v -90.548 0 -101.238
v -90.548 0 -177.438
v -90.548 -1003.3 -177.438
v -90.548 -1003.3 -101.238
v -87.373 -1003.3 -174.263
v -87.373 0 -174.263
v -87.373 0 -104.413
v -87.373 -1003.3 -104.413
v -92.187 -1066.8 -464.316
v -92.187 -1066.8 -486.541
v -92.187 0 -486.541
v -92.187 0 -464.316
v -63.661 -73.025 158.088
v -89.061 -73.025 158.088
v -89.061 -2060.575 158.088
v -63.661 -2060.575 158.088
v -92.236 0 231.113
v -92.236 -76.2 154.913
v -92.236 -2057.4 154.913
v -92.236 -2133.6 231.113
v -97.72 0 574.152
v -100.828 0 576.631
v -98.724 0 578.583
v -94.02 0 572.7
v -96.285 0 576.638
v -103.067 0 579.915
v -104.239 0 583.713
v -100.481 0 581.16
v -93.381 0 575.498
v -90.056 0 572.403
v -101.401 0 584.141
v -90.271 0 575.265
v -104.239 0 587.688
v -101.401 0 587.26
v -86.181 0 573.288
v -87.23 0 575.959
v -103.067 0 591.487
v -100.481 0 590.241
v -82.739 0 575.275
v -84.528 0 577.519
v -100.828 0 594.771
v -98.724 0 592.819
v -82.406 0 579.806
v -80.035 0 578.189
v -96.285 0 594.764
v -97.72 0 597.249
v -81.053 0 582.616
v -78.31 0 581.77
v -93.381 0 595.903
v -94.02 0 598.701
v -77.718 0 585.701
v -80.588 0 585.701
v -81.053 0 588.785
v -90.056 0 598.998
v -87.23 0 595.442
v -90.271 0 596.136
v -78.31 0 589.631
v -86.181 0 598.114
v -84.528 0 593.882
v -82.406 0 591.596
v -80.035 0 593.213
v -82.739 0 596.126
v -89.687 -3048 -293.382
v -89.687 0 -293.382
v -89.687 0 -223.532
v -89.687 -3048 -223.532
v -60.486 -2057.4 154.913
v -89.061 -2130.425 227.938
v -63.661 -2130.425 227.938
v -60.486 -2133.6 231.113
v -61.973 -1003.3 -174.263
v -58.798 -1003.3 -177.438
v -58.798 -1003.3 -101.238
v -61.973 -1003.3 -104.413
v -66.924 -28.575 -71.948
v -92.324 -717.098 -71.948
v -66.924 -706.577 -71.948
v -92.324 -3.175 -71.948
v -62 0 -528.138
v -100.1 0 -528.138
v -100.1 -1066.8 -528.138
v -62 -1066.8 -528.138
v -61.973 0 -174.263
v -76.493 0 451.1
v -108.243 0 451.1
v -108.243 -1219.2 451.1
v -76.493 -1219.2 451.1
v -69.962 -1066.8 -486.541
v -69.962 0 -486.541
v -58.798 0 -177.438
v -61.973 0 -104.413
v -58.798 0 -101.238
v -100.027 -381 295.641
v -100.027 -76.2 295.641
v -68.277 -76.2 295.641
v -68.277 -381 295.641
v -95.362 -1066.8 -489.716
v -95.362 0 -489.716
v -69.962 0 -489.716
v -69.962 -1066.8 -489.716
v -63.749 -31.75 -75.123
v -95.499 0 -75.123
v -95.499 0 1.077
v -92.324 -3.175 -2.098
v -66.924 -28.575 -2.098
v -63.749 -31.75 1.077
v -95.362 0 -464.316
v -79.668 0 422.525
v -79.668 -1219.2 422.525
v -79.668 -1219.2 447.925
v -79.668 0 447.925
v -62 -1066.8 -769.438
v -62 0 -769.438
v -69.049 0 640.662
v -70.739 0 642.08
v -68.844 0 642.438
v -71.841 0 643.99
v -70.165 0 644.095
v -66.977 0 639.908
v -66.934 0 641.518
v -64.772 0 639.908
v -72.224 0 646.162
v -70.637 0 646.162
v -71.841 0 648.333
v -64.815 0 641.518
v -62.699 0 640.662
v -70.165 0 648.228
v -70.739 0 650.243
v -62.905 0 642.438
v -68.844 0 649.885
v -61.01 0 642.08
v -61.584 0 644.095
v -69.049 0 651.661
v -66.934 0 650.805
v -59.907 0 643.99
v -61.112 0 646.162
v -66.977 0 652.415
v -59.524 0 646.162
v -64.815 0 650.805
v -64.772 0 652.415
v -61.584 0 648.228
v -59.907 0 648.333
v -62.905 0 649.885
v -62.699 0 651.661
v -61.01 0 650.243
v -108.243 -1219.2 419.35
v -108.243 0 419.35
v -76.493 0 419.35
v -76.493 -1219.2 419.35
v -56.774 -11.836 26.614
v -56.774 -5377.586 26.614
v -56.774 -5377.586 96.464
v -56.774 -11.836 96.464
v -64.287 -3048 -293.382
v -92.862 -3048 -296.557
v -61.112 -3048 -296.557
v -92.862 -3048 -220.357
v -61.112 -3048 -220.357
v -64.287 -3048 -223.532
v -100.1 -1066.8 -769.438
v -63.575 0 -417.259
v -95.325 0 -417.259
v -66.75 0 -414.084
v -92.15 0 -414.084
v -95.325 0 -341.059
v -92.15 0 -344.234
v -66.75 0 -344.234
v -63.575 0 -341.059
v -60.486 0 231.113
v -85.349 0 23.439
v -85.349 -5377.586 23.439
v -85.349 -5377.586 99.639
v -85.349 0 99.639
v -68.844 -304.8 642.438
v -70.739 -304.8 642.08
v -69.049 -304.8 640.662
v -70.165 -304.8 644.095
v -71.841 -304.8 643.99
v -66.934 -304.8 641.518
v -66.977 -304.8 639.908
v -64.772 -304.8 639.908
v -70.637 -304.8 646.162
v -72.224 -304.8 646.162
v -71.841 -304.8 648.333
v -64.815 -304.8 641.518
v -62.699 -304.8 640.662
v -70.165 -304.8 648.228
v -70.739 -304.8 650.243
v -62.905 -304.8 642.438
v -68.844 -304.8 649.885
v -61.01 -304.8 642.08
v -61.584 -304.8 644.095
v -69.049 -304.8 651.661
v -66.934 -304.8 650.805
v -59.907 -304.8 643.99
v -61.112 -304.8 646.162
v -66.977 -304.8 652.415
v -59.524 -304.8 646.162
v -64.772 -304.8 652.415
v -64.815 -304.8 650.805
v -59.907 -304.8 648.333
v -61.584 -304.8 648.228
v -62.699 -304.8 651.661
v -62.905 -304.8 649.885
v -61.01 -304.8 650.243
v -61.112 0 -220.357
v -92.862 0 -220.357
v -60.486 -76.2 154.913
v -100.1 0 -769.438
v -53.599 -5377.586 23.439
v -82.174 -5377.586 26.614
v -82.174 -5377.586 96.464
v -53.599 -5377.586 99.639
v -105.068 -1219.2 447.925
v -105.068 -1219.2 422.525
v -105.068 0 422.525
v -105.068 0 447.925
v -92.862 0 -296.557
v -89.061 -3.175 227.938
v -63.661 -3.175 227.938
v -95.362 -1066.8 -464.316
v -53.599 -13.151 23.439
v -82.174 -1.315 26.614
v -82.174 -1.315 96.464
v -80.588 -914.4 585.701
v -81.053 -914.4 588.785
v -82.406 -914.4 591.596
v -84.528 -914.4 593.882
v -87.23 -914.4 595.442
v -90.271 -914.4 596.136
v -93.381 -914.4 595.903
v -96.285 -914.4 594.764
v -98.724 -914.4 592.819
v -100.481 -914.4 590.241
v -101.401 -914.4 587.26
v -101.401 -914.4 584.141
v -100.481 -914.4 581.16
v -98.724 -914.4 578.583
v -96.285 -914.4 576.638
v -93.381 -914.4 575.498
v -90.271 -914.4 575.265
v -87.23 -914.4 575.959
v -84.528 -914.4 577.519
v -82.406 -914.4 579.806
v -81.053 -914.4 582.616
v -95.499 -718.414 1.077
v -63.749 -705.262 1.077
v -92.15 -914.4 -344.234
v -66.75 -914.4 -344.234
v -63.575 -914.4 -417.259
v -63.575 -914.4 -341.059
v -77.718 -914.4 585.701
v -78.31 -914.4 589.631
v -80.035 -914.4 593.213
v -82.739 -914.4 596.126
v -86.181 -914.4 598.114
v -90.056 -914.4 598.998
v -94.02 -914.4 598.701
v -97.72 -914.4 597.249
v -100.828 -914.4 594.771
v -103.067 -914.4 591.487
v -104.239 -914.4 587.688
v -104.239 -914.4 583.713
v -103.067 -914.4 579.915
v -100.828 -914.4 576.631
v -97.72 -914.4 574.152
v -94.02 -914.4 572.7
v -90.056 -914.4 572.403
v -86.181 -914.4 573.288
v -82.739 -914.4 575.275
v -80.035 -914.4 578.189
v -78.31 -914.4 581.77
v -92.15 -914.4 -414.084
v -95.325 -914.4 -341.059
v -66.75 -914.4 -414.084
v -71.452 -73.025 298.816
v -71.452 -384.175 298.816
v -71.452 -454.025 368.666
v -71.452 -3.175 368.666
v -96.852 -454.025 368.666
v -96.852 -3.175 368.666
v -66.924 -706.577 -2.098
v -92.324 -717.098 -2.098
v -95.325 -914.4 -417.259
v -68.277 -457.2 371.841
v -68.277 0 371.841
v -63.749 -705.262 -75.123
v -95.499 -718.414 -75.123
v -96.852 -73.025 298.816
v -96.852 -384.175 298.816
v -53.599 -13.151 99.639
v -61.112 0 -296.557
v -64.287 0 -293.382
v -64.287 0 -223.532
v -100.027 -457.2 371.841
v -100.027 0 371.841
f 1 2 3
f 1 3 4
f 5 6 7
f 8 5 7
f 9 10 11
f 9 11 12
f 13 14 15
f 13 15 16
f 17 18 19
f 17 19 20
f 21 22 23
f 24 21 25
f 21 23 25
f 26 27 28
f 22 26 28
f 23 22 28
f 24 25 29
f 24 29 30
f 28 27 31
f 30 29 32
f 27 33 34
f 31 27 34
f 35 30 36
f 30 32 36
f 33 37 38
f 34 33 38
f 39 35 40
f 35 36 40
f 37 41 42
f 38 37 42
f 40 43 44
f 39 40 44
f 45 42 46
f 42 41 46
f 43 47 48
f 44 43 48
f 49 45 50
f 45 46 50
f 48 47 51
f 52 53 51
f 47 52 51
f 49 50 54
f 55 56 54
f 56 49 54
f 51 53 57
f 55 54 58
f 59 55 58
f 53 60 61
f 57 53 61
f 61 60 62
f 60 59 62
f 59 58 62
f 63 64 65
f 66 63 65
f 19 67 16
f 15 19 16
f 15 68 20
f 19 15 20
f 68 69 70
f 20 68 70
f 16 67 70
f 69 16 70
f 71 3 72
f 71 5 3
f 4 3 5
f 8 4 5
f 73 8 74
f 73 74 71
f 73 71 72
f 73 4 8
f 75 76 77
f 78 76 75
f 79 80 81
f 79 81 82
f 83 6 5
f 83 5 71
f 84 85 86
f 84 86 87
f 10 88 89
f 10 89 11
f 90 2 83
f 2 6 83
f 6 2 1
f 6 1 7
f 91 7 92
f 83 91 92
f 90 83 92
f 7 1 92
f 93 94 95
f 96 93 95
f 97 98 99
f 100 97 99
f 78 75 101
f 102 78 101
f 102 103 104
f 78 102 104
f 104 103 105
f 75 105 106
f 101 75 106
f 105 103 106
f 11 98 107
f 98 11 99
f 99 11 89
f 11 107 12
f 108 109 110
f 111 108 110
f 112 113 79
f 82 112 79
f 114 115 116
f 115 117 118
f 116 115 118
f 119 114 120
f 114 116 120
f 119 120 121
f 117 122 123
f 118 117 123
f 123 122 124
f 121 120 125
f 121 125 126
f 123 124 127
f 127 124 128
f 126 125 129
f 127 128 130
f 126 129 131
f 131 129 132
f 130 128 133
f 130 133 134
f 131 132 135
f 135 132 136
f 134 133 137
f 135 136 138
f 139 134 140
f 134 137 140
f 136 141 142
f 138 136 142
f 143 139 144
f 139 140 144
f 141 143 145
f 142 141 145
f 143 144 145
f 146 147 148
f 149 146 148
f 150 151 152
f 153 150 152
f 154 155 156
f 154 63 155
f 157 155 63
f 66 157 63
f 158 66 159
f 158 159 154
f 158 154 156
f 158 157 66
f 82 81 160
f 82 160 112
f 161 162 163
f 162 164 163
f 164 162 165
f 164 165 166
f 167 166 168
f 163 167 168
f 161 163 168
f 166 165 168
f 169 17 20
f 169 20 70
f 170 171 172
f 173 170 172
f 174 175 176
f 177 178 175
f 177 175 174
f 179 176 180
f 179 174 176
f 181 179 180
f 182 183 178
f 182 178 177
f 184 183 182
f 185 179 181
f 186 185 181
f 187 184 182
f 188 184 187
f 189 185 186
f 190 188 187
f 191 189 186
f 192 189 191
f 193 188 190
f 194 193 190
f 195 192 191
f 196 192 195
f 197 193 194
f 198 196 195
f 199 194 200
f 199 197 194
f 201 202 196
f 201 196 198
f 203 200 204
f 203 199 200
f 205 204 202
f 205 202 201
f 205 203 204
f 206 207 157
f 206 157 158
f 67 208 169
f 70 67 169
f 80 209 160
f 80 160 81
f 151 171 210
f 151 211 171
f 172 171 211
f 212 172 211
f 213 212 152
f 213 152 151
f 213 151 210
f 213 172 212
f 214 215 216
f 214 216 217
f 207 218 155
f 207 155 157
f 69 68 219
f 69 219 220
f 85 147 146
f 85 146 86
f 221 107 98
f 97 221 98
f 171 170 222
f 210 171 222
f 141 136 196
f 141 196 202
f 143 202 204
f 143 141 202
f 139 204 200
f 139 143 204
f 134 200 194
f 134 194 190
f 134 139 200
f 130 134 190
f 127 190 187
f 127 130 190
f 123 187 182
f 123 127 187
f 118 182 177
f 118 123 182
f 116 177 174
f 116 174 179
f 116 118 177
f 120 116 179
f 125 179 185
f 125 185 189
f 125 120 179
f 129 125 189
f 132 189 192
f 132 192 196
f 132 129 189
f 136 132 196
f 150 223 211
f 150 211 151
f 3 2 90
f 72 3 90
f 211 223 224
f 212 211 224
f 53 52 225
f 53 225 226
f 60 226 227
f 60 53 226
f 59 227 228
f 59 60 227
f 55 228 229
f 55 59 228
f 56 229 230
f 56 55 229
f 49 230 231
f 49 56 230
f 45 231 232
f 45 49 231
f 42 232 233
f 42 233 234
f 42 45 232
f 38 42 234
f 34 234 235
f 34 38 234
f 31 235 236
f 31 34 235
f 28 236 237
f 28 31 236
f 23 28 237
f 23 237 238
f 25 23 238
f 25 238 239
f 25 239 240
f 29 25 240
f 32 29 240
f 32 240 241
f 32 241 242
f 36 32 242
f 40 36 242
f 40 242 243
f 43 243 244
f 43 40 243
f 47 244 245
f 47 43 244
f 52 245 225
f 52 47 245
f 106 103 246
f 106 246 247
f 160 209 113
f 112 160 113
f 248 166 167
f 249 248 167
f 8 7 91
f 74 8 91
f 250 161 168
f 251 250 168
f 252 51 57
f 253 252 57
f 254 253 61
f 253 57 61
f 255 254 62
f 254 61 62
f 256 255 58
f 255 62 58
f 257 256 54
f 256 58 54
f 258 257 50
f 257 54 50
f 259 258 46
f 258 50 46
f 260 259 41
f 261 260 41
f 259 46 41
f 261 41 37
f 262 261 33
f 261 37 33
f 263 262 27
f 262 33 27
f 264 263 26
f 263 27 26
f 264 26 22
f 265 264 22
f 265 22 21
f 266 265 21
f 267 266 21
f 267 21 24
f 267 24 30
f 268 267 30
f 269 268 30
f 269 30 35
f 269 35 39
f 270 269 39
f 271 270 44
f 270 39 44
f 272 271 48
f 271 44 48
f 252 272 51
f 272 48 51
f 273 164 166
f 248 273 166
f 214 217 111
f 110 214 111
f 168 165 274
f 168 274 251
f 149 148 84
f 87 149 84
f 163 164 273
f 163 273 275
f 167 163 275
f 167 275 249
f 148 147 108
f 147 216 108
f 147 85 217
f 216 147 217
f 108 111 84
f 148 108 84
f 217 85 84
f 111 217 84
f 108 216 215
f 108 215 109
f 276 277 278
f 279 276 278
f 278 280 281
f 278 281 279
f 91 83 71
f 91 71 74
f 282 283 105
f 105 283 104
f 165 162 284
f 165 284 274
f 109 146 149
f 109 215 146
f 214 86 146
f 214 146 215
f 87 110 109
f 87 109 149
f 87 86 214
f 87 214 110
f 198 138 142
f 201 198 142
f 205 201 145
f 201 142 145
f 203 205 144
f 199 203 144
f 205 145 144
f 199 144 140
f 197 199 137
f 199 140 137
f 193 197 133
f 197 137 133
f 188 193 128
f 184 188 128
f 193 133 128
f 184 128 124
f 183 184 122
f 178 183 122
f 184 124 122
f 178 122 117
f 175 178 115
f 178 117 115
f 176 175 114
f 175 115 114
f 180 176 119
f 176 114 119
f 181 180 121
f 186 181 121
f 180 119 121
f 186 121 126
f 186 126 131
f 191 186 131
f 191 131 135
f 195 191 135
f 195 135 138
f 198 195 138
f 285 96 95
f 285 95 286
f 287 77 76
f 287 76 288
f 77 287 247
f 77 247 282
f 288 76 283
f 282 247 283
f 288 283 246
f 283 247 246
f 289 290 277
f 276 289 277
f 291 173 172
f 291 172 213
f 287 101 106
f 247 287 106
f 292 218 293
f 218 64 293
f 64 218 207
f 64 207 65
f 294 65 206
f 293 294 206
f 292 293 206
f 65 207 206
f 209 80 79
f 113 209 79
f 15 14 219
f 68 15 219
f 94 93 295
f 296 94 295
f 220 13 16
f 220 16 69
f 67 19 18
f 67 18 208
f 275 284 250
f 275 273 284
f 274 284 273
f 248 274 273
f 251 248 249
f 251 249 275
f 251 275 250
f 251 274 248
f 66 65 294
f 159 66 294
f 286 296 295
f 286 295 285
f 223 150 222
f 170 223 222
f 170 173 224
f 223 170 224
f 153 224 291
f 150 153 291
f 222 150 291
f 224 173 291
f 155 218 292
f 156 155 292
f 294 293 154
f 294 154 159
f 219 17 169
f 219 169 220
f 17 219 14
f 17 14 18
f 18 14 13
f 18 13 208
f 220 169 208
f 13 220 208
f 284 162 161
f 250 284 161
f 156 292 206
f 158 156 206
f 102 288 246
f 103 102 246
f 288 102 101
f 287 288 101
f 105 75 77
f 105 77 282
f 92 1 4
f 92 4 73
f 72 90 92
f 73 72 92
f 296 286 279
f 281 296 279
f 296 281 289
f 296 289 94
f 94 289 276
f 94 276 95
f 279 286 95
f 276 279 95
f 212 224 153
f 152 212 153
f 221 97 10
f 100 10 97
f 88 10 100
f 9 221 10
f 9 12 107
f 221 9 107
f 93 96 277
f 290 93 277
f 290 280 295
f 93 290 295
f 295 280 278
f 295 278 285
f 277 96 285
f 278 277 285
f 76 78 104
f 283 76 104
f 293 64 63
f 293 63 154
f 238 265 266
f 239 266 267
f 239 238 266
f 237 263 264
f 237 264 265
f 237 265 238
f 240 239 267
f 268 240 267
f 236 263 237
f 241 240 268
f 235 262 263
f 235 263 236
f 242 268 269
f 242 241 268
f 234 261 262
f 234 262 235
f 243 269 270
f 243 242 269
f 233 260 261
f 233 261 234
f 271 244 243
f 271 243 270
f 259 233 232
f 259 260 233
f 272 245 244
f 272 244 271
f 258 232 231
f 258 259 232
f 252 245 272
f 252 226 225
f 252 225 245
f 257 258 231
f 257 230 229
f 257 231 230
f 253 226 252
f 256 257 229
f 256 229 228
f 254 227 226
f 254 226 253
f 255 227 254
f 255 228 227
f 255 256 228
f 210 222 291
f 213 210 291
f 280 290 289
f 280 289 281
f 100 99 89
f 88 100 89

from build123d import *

# Parameters (mm, degrees)
F0_W      = 31.75
F0_H      = 76.2
F0_W_2    = 25.4
F0_H_2    = 69.85
F1_DEPTH  = 5377.5864
F2_DEPTH  = 718.4136
F3_DEPTH  = 1003.3
F4_DEPTH  = 3048
F6_DEPTH  = 76.2
F8_DEPTH  = 76.2
F9_DEPTH  = 1066.8
F0_W_3    = 38.1
F0_H_3    = 241.3
F10_DEPTH = 1066.8
F11_DEPTH = 2133.6
F13_DEPTH = 31.75
F14_DEPTH = 914.4
F15_DEPTH = 457.2
F17_DEPTH = 31.75
F0_H_4    = 31.75
F0_H_5    = 25.4
F18_DEPTH = 1219.2
F0_R      = 6.35
F0_R_2    = 4.7625
F19_DEPTH = 304.8
F0_R_3    = 13.335
F0_R_4    = 10.4648
F20_DEPTH = 914.4


with BuildPart() as f1:
    # F0 (on Front) → F1 (new body)
    with BuildSketch(Plane.XZ):
        with Locations((-69.473676, 61.539123)):
            Rectangle(F0_W, F0_H)
        with Locations((-69.473676, 61.539123)):
            Rectangle(F0_W_2, F0_H_2, mode=Mode.SUBTRACT)
    extrude(amount=F1_DEPTH)

    # F5 (on face) → F6 (cut)
    with BuildSketch(Plane.XY.offset(99.639123)):
        Polygon((-53.598676, 0), (-85.348676, 0), (-53.598676, -13.151281), align=None)
    extrude(amount=-F6_DEPTH, mode=Mode.SUBTRACT)


with BuildPart() as f2:
    # F0 (on Front) → F2 (new body)
    with BuildSketch(Plane.XZ):
        with Locations((-79.623617, -37.023183)):
            Rectangle(F0_W, F0_H)
        with Locations((-79.623617, -37.023183)):
            Rectangle(F0_W_2, F0_H_2, mode=Mode.SUBTRACT)
    extrude(amount=F2_DEPTH)

    # F7 (on face) → F8 (cut)
    with BuildSketch(Plane.XY.offset(1.076817)):
        Polygon((-63.748617, 0), (-95.498617, 0), (-63.748617, -31.75), align=None)
        Polygon((-63.748617, -705.262319), (-95.498617, -718.4136), (-63.748617, -718.4136), align=None)
    extrude(amount=-F8_DEPTH, mode=Mode.SUBTRACT)


with BuildPart() as f3:
    # F0 (on Front) → F3 (new body)
    with BuildSketch(Plane.XZ):
        with Locations((-74.672617, -139.33751)):
            Rectangle(F0_W, F0_H)
        with Locations((-74.672617, -139.33751)):
            Rectangle(F0_W_2, F0_H_2, mode=Mode.SUBTRACT)
    extrude(amount=F3_DEPTH)


with BuildPart() as f4:
    # F0 (on Front) → F4 (new body)
    with BuildSketch(Plane.XZ):
        with Locations((-76.986946, -258.456767)):
            Rectangle(F0_W, F0_H)
        with Locations((-76.986946, -258.456767)):
            Rectangle(F0_W_2, F0_H_2, mode=Mode.SUBTRACT)
    extrude(amount=F4_DEPTH)


with BuildPart() as f9:
    # F0 (on Front) → F9 (new body)
    with BuildSketch(Plane.XZ):
        Polygon((-92.18659, -464.315517), (-95.36159, -464.315517), (-95.36159, -489.715517), (-69.96159, -489.715517), (-69.96159, -486.540517), (-92.18659, -486.540517), align=None)
    extrude(amount=F9_DEPTH)


with BuildPart() as f10:
    # F0 (on Front) → F10 (new body, through all)
    with BuildSketch(Plane.XZ):
        with Locations((-81.049735, -648.787522)):
            Rectangle(F0_W_3, F0_H_3)
    extrude(amount=F10_DEPTH)


with BuildPart() as f11:
    # F0 (on Front) → F11 (new body)
    with BuildSketch(Plane.XZ):
        with Locations((-76.360703, 193.013325)):
            Rectangle(F0_W, F0_H)
        with Locations((-76.360703, 193.013325)):
            Rectangle(F0_W_2, F0_H_2, mode=Mode.SUBTRACT)
    extrude(amount=F11_DEPTH)

    # F12 (on face) → F13 (cut)
    with BuildSketch(Plane.YZ.offset(-60.485703)):
        Polygon((0, 154.913325), (0, 231.113325), (-76.2, 154.913325), align=None)
        Polygon((-2057.4, 154.913325), (-2133.6, 231.113325), (-2133.6, 154.913325), align=None)
    extrude(amount=-F13_DEPTH, mode=Mode.SUBTRACT)


with BuildPart() as f14:
    # F0 (on Front) → F14 (new body)
    with BuildSketch(Plane.XZ):
        with Locations((-79.450257, -379.158974)):
            Rectangle(F0_W, F0_H)
        with Locations((-79.450257, -379.158974)):
            Rectangle(F0_W_2, F0_H_2, mode=Mode.SUBTRACT)
    extrude(amount=F14_DEPTH)


with BuildPart() as f15:
    # F0 (on Front) → F15 (new body)
    with BuildSketch(Plane.XZ):
        with Locations((-84.152453, 333.741009)):
            Rectangle(F0_W, F0_H)
        with Locations((-84.152453, 333.741009)):
            Rectangle(F0_W_2, F0_H_2, mode=Mode.SUBTRACT)
    extrude(amount=F15_DEPTH)

    # F16 (on face) → F17 (cut)
    with BuildSketch(Plane.YZ.offset(-68.277453)):
        Polygon((-381, 295.641009), (-457.2, 371.841009), (-457.2, 295.641009), align=None)
        Polygon((0, 295.641009), (0, 371.841009), (-76.2, 295.641009), align=None)
    extrude(amount=-F17_DEPTH, mode=Mode.SUBTRACT)


with BuildPart() as f18:
    # F0 (on Front) → F18 (new body)
    with BuildSketch(Plane.XZ):
        with Locations((-92.367586, 435.225058)):
            Rectangle(F0_W, F0_H_4)
        with Locations((-92.367586, 435.225058)):
            Rectangle(F0_W_2, F0_H_5, mode=Mode.SUBTRACT)
    extrude(amount=F18_DEPTH)


with BuildPart() as f19:
    # F0 (on Front) → F19 (new body)
    with BuildSketch(Plane.XZ):
        with Locations((-65.874446, 646.161556)):
            Circle(F0_R)
        with Locations((-65.874446, 646.161556)):
            Circle(F0_R_2, mode=Mode.SUBTRACT)
    extrude(amount=F19_DEPTH)


with BuildPart() as f20:
    # F0 (on Front) → F20 (new body)
    with BuildSketch(Plane.XZ):
        with Locations((-91.05286, 585.70075)):
            Circle(F0_R_3)
        with Locations((-91.05286, 585.70075)):
            Circle(F0_R_4, mode=Mode.SUBTRACT)
    extrude(amount=F20_DEPTH)


solid = Compound([f1.part, f2.part, f3.part, f4.part, f9.part, f10.part, f11.part, f14.part, f15.part, f18.part, f19.part, f20.part])
